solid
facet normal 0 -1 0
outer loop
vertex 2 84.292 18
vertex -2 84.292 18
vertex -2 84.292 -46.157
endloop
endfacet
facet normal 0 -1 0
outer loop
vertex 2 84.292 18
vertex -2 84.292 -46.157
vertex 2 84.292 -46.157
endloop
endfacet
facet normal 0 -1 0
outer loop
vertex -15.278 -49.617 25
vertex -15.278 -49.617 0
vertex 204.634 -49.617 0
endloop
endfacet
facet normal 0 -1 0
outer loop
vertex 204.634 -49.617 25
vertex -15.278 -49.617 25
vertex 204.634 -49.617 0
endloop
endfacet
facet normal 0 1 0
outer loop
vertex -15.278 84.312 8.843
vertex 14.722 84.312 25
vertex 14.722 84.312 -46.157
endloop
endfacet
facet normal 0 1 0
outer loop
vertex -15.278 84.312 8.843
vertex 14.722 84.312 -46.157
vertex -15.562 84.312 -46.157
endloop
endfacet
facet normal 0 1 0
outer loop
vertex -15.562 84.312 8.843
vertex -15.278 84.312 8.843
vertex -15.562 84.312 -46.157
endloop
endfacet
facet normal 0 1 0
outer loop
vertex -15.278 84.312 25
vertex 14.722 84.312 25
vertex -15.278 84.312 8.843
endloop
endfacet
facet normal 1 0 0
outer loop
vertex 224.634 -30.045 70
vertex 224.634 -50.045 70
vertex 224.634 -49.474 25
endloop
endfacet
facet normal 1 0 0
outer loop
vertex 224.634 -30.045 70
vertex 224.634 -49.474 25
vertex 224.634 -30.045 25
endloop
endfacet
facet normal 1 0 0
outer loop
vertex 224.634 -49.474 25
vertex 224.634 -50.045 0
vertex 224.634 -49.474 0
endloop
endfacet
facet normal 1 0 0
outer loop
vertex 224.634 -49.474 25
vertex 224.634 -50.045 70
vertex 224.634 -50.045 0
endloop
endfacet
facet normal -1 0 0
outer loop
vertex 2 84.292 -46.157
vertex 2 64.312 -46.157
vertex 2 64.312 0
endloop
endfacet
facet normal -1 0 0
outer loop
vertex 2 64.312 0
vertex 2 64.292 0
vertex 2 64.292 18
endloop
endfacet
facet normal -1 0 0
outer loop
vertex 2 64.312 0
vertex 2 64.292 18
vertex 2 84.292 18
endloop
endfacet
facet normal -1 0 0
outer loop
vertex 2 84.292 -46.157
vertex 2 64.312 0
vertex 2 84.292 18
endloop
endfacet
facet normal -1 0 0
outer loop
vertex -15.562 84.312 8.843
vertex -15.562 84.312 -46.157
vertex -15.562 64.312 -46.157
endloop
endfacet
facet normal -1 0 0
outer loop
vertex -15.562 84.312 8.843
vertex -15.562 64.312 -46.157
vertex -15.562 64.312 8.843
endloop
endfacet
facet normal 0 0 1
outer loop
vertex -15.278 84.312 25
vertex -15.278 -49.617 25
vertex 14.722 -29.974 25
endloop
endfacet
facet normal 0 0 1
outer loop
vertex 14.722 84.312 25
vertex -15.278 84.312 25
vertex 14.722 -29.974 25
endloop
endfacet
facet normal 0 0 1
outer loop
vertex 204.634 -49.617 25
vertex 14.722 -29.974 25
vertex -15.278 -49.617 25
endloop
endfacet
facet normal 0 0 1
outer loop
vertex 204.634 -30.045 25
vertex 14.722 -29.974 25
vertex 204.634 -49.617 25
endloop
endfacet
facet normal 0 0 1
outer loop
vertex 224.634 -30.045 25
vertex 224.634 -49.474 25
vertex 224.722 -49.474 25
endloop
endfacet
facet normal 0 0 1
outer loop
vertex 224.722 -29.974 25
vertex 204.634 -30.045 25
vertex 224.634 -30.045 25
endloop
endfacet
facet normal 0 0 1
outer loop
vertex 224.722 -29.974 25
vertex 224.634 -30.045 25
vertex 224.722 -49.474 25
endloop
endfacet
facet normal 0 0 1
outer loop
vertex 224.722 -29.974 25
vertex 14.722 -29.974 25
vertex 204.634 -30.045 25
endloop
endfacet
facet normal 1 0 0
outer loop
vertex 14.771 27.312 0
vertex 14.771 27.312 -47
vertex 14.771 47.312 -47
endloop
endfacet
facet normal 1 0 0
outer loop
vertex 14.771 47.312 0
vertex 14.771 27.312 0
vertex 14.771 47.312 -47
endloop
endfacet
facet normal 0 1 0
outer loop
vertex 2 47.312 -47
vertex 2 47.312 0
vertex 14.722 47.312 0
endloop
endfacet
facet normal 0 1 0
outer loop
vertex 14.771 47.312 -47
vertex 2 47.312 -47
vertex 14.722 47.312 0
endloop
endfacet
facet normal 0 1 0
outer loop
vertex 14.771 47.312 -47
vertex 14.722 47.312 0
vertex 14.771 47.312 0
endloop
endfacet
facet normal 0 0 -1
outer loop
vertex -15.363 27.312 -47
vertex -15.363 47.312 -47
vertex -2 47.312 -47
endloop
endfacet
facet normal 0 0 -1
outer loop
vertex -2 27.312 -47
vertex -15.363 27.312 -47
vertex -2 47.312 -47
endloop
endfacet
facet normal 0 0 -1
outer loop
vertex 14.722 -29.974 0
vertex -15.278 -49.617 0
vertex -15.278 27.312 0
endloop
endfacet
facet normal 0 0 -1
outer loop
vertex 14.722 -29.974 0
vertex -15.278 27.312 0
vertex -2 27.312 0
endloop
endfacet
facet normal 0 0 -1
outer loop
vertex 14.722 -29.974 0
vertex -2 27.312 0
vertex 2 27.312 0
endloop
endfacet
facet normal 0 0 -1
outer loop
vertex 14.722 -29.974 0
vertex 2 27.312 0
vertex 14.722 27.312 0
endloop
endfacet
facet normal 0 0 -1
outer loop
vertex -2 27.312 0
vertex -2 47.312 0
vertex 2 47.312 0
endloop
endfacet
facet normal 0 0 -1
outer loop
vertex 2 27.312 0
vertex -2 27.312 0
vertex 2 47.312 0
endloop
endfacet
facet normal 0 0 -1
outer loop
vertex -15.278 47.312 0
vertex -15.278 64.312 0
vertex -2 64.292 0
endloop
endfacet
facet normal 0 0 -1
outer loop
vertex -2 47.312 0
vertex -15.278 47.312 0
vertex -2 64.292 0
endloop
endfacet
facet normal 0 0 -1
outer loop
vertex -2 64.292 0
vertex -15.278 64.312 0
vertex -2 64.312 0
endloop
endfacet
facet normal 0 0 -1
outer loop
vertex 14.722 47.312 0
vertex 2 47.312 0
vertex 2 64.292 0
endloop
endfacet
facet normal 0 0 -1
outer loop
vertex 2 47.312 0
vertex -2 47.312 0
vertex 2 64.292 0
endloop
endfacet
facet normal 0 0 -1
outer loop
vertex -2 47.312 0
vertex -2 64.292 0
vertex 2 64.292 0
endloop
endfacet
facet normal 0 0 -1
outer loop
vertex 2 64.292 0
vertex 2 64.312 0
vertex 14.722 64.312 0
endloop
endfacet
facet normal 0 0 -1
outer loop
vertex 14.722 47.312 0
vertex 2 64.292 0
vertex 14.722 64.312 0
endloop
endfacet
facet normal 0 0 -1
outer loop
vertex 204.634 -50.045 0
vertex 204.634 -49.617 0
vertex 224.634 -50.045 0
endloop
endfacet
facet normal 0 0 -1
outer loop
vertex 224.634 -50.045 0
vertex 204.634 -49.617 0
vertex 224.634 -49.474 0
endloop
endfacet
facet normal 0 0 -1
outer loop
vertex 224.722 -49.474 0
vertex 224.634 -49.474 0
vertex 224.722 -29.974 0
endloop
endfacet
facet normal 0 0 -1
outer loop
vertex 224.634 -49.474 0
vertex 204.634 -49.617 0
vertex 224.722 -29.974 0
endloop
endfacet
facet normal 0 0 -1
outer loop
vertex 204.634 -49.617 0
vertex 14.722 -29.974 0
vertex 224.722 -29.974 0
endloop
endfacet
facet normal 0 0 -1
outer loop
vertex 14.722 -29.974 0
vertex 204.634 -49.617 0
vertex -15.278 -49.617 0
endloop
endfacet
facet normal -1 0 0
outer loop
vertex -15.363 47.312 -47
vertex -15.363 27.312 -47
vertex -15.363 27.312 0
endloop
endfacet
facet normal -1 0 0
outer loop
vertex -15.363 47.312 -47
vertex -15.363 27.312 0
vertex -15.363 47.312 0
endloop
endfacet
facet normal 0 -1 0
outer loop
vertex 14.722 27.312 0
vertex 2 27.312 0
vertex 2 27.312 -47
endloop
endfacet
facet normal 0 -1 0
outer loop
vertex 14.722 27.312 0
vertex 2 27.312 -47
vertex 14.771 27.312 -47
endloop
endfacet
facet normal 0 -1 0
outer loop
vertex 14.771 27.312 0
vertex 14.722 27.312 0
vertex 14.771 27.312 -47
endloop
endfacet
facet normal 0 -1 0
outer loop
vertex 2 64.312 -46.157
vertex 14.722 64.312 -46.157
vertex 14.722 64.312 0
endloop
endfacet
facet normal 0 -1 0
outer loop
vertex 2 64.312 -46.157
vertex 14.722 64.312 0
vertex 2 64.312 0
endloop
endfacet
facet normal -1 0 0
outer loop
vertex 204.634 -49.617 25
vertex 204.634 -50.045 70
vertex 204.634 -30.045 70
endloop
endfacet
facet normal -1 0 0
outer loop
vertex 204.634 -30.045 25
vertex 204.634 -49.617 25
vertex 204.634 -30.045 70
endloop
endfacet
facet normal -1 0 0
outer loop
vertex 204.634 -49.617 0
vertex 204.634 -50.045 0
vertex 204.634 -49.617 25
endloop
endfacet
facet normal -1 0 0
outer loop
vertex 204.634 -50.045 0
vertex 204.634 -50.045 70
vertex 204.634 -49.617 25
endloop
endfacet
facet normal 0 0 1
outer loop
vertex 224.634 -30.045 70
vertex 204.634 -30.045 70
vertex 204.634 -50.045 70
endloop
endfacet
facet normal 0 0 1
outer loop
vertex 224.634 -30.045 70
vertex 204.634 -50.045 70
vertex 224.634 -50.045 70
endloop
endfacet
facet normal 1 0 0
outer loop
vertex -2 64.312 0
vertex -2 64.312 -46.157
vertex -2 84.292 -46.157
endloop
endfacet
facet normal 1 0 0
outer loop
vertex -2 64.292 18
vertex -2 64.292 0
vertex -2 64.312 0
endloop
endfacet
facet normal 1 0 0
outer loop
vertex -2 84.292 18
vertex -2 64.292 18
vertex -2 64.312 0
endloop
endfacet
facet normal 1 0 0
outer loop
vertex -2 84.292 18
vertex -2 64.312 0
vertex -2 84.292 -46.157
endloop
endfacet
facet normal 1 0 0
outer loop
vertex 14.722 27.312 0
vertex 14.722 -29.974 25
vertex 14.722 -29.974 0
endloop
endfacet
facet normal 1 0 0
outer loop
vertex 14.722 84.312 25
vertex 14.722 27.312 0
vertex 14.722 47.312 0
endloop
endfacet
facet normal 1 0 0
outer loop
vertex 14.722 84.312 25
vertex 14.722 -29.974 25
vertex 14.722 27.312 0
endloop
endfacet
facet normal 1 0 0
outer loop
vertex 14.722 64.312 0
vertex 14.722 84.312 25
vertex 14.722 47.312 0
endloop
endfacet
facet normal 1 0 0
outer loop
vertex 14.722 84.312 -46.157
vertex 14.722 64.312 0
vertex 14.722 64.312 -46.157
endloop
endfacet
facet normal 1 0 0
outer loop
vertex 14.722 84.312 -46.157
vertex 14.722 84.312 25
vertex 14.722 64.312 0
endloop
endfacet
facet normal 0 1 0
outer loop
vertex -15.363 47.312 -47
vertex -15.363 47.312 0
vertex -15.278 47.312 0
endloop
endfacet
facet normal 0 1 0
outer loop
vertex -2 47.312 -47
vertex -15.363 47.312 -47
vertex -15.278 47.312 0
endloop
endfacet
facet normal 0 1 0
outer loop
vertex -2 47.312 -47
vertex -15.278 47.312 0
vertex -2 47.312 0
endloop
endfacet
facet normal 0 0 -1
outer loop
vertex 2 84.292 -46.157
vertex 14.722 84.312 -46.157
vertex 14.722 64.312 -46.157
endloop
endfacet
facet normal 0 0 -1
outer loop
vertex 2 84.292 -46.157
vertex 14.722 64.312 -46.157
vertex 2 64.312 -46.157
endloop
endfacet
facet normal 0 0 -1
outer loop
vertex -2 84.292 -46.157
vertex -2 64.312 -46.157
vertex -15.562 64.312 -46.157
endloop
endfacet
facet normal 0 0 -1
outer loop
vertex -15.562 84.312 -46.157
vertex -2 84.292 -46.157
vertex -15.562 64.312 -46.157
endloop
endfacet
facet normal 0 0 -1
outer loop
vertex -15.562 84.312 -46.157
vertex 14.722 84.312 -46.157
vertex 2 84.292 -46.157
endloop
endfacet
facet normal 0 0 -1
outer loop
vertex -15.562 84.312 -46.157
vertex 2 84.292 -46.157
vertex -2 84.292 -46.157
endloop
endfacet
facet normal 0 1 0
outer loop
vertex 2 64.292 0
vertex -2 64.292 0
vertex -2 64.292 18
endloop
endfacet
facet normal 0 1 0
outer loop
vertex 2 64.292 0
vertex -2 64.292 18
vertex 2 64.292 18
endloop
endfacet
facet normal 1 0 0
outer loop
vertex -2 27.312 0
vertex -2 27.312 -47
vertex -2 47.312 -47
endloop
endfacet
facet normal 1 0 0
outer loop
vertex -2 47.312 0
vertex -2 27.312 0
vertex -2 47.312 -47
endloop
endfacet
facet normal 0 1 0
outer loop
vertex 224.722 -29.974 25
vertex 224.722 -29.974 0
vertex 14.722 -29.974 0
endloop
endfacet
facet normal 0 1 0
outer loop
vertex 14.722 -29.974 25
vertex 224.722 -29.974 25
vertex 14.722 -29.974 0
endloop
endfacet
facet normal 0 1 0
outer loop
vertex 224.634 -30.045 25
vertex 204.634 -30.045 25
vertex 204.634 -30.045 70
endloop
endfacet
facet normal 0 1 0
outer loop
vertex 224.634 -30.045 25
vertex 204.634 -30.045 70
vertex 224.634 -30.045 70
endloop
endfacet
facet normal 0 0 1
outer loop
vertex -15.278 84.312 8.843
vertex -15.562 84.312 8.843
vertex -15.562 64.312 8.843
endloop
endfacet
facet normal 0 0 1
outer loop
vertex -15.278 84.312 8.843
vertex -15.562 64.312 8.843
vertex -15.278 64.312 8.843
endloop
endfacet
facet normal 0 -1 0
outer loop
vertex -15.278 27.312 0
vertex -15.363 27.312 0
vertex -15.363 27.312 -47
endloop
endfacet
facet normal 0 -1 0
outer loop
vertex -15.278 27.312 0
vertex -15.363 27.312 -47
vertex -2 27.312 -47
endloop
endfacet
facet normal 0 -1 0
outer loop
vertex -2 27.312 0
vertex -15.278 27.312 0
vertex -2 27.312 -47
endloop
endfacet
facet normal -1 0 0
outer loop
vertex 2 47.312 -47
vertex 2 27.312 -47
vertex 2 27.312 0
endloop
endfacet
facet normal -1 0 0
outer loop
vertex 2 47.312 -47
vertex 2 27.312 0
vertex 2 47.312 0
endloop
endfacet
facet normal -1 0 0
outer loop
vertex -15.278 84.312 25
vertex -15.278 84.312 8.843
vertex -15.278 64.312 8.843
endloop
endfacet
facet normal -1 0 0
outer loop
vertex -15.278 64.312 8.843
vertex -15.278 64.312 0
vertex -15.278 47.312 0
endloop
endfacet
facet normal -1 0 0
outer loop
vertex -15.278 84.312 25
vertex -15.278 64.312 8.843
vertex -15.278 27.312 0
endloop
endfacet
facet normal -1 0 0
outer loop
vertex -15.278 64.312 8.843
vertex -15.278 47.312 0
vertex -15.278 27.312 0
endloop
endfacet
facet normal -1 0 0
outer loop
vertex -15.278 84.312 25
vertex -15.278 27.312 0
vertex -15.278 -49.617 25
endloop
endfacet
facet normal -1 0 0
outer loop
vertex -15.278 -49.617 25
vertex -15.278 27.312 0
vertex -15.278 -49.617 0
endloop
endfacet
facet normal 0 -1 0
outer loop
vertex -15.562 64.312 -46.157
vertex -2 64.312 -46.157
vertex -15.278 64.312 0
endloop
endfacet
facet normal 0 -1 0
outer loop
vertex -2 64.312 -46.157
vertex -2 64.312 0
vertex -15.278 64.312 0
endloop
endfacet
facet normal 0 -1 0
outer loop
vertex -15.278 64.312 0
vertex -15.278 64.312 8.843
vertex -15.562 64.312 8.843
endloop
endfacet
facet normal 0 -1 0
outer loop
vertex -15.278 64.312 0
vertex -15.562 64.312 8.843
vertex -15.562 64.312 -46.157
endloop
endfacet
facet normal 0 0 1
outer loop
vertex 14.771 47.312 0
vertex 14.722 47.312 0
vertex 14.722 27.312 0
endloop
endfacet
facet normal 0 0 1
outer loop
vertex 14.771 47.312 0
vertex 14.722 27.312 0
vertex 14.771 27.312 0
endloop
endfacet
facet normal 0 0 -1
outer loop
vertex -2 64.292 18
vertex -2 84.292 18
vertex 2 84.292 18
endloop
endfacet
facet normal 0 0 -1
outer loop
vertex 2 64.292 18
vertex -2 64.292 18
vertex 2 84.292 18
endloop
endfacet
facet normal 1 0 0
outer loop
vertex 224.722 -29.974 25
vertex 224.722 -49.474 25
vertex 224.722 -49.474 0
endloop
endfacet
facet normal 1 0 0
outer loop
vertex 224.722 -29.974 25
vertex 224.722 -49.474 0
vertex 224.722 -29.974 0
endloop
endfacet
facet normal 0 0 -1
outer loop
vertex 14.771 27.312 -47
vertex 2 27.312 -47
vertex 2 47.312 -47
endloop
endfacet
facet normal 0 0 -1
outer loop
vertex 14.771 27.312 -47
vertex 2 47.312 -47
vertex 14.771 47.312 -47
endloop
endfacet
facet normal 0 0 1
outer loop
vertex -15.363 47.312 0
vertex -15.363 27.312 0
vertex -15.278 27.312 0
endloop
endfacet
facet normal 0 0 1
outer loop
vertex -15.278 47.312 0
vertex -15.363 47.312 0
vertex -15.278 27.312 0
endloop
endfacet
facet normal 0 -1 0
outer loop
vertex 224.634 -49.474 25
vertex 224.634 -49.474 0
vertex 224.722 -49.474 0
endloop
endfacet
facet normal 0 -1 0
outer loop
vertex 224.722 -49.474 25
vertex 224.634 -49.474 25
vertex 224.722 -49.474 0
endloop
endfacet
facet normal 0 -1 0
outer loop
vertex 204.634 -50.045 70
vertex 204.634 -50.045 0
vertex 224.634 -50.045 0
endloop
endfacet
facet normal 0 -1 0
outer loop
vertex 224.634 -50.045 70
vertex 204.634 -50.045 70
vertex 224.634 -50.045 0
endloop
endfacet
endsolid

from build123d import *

# Parameters (mm, degrees)
F1_DEPTH      = 25
F2_W          = 30
F2_H          = 8.8426908478
F3_DEPTH      = 20
F5_W          = 4
F5_H          = 20
F6_DEPTH      = 46.1583091522
F6_DEPTH_BACK = 18
F7_W          = 20
F7_H          = 20
F8_DEPTH      = 70
F9_W          = 13.3632806614
F9_H          = 20
F9_W_2        = 12.7708598524
F10_DEPTH     = 47


with BuildPart() as f1:
    # F0 (on Top) → F1 (new body)
    with BuildSketch(Plane.XY):
        Polygon((120.722244599, -49.4738900023), (120.722244599, -29.9738900023), (-89.277755401, -29.9738900023), (-89.277755401, 84.3118136035), (-119.277755401, 84.3118136035), (-119.277755401, -49.6167442972), (110.722244599, -49.6167442972), (110.722244599, -49.4738900023), align=None)
    extrude(amount=F1_DEPTH)

    # F2 (on face) → F3 (join)
    with BuildSketch(Plane(origin=(0, 84.3118136035, 0), x_dir=(-1, 0, 0), z_dir=(0, 1, 0))):
        Polygon((119.5622932736, 8.8426908478), (119.277755401, 8.8426908478), (119.277755401, 0), (89.277755401, 0), (89.277755401, -46.1573091522), (119.5622932736, -46.1573091522), align=None)
        with Locations((104.277755401, 4.4213454239)):
            Rectangle(F2_W, F2_H)
    extrude(amount=-F3_DEPTH)


with BuildPart() as f1_1:
    # F4: moved
    add(f1.part.moved(Location((104, 0, 0))))

    # F5 (on Top) → F6 (cut, two sides)
    with BuildSketch(Plane.XY) as f6_sk:
        with Locations((-9.5e-08, 74.2918348312)):
            Rectangle(F5_W, F5_H)
    extrude(amount=-F6_DEPTH, mode=Mode.SUBTRACT)
    extrude(f6_sk.sketch, amount=F6_DEPTH_BACK, mode=Mode.SUBTRACT)

    # F7 (on Top) → F8 (join)
    with BuildSketch(Plane.XY):
        with Locations((214.6340256929, -40.0454027206)):
            Rectangle(F7_W, F7_H)
    extrude(amount=F8_DEPTH)

    # F9 (on Top) → F10 (join)
    with BuildSketch(Plane.XY):
        with Locations((-8.6816403307, 37.3118136035)):
            Rectangle(F9_W, F9_H)
        with Locations((8.3854299262, 37.3118136035)):
            Rectangle(F9_W_2, F9_H)
    extrude(amount=-F10_DEPTH)


solid = f1_1.part
